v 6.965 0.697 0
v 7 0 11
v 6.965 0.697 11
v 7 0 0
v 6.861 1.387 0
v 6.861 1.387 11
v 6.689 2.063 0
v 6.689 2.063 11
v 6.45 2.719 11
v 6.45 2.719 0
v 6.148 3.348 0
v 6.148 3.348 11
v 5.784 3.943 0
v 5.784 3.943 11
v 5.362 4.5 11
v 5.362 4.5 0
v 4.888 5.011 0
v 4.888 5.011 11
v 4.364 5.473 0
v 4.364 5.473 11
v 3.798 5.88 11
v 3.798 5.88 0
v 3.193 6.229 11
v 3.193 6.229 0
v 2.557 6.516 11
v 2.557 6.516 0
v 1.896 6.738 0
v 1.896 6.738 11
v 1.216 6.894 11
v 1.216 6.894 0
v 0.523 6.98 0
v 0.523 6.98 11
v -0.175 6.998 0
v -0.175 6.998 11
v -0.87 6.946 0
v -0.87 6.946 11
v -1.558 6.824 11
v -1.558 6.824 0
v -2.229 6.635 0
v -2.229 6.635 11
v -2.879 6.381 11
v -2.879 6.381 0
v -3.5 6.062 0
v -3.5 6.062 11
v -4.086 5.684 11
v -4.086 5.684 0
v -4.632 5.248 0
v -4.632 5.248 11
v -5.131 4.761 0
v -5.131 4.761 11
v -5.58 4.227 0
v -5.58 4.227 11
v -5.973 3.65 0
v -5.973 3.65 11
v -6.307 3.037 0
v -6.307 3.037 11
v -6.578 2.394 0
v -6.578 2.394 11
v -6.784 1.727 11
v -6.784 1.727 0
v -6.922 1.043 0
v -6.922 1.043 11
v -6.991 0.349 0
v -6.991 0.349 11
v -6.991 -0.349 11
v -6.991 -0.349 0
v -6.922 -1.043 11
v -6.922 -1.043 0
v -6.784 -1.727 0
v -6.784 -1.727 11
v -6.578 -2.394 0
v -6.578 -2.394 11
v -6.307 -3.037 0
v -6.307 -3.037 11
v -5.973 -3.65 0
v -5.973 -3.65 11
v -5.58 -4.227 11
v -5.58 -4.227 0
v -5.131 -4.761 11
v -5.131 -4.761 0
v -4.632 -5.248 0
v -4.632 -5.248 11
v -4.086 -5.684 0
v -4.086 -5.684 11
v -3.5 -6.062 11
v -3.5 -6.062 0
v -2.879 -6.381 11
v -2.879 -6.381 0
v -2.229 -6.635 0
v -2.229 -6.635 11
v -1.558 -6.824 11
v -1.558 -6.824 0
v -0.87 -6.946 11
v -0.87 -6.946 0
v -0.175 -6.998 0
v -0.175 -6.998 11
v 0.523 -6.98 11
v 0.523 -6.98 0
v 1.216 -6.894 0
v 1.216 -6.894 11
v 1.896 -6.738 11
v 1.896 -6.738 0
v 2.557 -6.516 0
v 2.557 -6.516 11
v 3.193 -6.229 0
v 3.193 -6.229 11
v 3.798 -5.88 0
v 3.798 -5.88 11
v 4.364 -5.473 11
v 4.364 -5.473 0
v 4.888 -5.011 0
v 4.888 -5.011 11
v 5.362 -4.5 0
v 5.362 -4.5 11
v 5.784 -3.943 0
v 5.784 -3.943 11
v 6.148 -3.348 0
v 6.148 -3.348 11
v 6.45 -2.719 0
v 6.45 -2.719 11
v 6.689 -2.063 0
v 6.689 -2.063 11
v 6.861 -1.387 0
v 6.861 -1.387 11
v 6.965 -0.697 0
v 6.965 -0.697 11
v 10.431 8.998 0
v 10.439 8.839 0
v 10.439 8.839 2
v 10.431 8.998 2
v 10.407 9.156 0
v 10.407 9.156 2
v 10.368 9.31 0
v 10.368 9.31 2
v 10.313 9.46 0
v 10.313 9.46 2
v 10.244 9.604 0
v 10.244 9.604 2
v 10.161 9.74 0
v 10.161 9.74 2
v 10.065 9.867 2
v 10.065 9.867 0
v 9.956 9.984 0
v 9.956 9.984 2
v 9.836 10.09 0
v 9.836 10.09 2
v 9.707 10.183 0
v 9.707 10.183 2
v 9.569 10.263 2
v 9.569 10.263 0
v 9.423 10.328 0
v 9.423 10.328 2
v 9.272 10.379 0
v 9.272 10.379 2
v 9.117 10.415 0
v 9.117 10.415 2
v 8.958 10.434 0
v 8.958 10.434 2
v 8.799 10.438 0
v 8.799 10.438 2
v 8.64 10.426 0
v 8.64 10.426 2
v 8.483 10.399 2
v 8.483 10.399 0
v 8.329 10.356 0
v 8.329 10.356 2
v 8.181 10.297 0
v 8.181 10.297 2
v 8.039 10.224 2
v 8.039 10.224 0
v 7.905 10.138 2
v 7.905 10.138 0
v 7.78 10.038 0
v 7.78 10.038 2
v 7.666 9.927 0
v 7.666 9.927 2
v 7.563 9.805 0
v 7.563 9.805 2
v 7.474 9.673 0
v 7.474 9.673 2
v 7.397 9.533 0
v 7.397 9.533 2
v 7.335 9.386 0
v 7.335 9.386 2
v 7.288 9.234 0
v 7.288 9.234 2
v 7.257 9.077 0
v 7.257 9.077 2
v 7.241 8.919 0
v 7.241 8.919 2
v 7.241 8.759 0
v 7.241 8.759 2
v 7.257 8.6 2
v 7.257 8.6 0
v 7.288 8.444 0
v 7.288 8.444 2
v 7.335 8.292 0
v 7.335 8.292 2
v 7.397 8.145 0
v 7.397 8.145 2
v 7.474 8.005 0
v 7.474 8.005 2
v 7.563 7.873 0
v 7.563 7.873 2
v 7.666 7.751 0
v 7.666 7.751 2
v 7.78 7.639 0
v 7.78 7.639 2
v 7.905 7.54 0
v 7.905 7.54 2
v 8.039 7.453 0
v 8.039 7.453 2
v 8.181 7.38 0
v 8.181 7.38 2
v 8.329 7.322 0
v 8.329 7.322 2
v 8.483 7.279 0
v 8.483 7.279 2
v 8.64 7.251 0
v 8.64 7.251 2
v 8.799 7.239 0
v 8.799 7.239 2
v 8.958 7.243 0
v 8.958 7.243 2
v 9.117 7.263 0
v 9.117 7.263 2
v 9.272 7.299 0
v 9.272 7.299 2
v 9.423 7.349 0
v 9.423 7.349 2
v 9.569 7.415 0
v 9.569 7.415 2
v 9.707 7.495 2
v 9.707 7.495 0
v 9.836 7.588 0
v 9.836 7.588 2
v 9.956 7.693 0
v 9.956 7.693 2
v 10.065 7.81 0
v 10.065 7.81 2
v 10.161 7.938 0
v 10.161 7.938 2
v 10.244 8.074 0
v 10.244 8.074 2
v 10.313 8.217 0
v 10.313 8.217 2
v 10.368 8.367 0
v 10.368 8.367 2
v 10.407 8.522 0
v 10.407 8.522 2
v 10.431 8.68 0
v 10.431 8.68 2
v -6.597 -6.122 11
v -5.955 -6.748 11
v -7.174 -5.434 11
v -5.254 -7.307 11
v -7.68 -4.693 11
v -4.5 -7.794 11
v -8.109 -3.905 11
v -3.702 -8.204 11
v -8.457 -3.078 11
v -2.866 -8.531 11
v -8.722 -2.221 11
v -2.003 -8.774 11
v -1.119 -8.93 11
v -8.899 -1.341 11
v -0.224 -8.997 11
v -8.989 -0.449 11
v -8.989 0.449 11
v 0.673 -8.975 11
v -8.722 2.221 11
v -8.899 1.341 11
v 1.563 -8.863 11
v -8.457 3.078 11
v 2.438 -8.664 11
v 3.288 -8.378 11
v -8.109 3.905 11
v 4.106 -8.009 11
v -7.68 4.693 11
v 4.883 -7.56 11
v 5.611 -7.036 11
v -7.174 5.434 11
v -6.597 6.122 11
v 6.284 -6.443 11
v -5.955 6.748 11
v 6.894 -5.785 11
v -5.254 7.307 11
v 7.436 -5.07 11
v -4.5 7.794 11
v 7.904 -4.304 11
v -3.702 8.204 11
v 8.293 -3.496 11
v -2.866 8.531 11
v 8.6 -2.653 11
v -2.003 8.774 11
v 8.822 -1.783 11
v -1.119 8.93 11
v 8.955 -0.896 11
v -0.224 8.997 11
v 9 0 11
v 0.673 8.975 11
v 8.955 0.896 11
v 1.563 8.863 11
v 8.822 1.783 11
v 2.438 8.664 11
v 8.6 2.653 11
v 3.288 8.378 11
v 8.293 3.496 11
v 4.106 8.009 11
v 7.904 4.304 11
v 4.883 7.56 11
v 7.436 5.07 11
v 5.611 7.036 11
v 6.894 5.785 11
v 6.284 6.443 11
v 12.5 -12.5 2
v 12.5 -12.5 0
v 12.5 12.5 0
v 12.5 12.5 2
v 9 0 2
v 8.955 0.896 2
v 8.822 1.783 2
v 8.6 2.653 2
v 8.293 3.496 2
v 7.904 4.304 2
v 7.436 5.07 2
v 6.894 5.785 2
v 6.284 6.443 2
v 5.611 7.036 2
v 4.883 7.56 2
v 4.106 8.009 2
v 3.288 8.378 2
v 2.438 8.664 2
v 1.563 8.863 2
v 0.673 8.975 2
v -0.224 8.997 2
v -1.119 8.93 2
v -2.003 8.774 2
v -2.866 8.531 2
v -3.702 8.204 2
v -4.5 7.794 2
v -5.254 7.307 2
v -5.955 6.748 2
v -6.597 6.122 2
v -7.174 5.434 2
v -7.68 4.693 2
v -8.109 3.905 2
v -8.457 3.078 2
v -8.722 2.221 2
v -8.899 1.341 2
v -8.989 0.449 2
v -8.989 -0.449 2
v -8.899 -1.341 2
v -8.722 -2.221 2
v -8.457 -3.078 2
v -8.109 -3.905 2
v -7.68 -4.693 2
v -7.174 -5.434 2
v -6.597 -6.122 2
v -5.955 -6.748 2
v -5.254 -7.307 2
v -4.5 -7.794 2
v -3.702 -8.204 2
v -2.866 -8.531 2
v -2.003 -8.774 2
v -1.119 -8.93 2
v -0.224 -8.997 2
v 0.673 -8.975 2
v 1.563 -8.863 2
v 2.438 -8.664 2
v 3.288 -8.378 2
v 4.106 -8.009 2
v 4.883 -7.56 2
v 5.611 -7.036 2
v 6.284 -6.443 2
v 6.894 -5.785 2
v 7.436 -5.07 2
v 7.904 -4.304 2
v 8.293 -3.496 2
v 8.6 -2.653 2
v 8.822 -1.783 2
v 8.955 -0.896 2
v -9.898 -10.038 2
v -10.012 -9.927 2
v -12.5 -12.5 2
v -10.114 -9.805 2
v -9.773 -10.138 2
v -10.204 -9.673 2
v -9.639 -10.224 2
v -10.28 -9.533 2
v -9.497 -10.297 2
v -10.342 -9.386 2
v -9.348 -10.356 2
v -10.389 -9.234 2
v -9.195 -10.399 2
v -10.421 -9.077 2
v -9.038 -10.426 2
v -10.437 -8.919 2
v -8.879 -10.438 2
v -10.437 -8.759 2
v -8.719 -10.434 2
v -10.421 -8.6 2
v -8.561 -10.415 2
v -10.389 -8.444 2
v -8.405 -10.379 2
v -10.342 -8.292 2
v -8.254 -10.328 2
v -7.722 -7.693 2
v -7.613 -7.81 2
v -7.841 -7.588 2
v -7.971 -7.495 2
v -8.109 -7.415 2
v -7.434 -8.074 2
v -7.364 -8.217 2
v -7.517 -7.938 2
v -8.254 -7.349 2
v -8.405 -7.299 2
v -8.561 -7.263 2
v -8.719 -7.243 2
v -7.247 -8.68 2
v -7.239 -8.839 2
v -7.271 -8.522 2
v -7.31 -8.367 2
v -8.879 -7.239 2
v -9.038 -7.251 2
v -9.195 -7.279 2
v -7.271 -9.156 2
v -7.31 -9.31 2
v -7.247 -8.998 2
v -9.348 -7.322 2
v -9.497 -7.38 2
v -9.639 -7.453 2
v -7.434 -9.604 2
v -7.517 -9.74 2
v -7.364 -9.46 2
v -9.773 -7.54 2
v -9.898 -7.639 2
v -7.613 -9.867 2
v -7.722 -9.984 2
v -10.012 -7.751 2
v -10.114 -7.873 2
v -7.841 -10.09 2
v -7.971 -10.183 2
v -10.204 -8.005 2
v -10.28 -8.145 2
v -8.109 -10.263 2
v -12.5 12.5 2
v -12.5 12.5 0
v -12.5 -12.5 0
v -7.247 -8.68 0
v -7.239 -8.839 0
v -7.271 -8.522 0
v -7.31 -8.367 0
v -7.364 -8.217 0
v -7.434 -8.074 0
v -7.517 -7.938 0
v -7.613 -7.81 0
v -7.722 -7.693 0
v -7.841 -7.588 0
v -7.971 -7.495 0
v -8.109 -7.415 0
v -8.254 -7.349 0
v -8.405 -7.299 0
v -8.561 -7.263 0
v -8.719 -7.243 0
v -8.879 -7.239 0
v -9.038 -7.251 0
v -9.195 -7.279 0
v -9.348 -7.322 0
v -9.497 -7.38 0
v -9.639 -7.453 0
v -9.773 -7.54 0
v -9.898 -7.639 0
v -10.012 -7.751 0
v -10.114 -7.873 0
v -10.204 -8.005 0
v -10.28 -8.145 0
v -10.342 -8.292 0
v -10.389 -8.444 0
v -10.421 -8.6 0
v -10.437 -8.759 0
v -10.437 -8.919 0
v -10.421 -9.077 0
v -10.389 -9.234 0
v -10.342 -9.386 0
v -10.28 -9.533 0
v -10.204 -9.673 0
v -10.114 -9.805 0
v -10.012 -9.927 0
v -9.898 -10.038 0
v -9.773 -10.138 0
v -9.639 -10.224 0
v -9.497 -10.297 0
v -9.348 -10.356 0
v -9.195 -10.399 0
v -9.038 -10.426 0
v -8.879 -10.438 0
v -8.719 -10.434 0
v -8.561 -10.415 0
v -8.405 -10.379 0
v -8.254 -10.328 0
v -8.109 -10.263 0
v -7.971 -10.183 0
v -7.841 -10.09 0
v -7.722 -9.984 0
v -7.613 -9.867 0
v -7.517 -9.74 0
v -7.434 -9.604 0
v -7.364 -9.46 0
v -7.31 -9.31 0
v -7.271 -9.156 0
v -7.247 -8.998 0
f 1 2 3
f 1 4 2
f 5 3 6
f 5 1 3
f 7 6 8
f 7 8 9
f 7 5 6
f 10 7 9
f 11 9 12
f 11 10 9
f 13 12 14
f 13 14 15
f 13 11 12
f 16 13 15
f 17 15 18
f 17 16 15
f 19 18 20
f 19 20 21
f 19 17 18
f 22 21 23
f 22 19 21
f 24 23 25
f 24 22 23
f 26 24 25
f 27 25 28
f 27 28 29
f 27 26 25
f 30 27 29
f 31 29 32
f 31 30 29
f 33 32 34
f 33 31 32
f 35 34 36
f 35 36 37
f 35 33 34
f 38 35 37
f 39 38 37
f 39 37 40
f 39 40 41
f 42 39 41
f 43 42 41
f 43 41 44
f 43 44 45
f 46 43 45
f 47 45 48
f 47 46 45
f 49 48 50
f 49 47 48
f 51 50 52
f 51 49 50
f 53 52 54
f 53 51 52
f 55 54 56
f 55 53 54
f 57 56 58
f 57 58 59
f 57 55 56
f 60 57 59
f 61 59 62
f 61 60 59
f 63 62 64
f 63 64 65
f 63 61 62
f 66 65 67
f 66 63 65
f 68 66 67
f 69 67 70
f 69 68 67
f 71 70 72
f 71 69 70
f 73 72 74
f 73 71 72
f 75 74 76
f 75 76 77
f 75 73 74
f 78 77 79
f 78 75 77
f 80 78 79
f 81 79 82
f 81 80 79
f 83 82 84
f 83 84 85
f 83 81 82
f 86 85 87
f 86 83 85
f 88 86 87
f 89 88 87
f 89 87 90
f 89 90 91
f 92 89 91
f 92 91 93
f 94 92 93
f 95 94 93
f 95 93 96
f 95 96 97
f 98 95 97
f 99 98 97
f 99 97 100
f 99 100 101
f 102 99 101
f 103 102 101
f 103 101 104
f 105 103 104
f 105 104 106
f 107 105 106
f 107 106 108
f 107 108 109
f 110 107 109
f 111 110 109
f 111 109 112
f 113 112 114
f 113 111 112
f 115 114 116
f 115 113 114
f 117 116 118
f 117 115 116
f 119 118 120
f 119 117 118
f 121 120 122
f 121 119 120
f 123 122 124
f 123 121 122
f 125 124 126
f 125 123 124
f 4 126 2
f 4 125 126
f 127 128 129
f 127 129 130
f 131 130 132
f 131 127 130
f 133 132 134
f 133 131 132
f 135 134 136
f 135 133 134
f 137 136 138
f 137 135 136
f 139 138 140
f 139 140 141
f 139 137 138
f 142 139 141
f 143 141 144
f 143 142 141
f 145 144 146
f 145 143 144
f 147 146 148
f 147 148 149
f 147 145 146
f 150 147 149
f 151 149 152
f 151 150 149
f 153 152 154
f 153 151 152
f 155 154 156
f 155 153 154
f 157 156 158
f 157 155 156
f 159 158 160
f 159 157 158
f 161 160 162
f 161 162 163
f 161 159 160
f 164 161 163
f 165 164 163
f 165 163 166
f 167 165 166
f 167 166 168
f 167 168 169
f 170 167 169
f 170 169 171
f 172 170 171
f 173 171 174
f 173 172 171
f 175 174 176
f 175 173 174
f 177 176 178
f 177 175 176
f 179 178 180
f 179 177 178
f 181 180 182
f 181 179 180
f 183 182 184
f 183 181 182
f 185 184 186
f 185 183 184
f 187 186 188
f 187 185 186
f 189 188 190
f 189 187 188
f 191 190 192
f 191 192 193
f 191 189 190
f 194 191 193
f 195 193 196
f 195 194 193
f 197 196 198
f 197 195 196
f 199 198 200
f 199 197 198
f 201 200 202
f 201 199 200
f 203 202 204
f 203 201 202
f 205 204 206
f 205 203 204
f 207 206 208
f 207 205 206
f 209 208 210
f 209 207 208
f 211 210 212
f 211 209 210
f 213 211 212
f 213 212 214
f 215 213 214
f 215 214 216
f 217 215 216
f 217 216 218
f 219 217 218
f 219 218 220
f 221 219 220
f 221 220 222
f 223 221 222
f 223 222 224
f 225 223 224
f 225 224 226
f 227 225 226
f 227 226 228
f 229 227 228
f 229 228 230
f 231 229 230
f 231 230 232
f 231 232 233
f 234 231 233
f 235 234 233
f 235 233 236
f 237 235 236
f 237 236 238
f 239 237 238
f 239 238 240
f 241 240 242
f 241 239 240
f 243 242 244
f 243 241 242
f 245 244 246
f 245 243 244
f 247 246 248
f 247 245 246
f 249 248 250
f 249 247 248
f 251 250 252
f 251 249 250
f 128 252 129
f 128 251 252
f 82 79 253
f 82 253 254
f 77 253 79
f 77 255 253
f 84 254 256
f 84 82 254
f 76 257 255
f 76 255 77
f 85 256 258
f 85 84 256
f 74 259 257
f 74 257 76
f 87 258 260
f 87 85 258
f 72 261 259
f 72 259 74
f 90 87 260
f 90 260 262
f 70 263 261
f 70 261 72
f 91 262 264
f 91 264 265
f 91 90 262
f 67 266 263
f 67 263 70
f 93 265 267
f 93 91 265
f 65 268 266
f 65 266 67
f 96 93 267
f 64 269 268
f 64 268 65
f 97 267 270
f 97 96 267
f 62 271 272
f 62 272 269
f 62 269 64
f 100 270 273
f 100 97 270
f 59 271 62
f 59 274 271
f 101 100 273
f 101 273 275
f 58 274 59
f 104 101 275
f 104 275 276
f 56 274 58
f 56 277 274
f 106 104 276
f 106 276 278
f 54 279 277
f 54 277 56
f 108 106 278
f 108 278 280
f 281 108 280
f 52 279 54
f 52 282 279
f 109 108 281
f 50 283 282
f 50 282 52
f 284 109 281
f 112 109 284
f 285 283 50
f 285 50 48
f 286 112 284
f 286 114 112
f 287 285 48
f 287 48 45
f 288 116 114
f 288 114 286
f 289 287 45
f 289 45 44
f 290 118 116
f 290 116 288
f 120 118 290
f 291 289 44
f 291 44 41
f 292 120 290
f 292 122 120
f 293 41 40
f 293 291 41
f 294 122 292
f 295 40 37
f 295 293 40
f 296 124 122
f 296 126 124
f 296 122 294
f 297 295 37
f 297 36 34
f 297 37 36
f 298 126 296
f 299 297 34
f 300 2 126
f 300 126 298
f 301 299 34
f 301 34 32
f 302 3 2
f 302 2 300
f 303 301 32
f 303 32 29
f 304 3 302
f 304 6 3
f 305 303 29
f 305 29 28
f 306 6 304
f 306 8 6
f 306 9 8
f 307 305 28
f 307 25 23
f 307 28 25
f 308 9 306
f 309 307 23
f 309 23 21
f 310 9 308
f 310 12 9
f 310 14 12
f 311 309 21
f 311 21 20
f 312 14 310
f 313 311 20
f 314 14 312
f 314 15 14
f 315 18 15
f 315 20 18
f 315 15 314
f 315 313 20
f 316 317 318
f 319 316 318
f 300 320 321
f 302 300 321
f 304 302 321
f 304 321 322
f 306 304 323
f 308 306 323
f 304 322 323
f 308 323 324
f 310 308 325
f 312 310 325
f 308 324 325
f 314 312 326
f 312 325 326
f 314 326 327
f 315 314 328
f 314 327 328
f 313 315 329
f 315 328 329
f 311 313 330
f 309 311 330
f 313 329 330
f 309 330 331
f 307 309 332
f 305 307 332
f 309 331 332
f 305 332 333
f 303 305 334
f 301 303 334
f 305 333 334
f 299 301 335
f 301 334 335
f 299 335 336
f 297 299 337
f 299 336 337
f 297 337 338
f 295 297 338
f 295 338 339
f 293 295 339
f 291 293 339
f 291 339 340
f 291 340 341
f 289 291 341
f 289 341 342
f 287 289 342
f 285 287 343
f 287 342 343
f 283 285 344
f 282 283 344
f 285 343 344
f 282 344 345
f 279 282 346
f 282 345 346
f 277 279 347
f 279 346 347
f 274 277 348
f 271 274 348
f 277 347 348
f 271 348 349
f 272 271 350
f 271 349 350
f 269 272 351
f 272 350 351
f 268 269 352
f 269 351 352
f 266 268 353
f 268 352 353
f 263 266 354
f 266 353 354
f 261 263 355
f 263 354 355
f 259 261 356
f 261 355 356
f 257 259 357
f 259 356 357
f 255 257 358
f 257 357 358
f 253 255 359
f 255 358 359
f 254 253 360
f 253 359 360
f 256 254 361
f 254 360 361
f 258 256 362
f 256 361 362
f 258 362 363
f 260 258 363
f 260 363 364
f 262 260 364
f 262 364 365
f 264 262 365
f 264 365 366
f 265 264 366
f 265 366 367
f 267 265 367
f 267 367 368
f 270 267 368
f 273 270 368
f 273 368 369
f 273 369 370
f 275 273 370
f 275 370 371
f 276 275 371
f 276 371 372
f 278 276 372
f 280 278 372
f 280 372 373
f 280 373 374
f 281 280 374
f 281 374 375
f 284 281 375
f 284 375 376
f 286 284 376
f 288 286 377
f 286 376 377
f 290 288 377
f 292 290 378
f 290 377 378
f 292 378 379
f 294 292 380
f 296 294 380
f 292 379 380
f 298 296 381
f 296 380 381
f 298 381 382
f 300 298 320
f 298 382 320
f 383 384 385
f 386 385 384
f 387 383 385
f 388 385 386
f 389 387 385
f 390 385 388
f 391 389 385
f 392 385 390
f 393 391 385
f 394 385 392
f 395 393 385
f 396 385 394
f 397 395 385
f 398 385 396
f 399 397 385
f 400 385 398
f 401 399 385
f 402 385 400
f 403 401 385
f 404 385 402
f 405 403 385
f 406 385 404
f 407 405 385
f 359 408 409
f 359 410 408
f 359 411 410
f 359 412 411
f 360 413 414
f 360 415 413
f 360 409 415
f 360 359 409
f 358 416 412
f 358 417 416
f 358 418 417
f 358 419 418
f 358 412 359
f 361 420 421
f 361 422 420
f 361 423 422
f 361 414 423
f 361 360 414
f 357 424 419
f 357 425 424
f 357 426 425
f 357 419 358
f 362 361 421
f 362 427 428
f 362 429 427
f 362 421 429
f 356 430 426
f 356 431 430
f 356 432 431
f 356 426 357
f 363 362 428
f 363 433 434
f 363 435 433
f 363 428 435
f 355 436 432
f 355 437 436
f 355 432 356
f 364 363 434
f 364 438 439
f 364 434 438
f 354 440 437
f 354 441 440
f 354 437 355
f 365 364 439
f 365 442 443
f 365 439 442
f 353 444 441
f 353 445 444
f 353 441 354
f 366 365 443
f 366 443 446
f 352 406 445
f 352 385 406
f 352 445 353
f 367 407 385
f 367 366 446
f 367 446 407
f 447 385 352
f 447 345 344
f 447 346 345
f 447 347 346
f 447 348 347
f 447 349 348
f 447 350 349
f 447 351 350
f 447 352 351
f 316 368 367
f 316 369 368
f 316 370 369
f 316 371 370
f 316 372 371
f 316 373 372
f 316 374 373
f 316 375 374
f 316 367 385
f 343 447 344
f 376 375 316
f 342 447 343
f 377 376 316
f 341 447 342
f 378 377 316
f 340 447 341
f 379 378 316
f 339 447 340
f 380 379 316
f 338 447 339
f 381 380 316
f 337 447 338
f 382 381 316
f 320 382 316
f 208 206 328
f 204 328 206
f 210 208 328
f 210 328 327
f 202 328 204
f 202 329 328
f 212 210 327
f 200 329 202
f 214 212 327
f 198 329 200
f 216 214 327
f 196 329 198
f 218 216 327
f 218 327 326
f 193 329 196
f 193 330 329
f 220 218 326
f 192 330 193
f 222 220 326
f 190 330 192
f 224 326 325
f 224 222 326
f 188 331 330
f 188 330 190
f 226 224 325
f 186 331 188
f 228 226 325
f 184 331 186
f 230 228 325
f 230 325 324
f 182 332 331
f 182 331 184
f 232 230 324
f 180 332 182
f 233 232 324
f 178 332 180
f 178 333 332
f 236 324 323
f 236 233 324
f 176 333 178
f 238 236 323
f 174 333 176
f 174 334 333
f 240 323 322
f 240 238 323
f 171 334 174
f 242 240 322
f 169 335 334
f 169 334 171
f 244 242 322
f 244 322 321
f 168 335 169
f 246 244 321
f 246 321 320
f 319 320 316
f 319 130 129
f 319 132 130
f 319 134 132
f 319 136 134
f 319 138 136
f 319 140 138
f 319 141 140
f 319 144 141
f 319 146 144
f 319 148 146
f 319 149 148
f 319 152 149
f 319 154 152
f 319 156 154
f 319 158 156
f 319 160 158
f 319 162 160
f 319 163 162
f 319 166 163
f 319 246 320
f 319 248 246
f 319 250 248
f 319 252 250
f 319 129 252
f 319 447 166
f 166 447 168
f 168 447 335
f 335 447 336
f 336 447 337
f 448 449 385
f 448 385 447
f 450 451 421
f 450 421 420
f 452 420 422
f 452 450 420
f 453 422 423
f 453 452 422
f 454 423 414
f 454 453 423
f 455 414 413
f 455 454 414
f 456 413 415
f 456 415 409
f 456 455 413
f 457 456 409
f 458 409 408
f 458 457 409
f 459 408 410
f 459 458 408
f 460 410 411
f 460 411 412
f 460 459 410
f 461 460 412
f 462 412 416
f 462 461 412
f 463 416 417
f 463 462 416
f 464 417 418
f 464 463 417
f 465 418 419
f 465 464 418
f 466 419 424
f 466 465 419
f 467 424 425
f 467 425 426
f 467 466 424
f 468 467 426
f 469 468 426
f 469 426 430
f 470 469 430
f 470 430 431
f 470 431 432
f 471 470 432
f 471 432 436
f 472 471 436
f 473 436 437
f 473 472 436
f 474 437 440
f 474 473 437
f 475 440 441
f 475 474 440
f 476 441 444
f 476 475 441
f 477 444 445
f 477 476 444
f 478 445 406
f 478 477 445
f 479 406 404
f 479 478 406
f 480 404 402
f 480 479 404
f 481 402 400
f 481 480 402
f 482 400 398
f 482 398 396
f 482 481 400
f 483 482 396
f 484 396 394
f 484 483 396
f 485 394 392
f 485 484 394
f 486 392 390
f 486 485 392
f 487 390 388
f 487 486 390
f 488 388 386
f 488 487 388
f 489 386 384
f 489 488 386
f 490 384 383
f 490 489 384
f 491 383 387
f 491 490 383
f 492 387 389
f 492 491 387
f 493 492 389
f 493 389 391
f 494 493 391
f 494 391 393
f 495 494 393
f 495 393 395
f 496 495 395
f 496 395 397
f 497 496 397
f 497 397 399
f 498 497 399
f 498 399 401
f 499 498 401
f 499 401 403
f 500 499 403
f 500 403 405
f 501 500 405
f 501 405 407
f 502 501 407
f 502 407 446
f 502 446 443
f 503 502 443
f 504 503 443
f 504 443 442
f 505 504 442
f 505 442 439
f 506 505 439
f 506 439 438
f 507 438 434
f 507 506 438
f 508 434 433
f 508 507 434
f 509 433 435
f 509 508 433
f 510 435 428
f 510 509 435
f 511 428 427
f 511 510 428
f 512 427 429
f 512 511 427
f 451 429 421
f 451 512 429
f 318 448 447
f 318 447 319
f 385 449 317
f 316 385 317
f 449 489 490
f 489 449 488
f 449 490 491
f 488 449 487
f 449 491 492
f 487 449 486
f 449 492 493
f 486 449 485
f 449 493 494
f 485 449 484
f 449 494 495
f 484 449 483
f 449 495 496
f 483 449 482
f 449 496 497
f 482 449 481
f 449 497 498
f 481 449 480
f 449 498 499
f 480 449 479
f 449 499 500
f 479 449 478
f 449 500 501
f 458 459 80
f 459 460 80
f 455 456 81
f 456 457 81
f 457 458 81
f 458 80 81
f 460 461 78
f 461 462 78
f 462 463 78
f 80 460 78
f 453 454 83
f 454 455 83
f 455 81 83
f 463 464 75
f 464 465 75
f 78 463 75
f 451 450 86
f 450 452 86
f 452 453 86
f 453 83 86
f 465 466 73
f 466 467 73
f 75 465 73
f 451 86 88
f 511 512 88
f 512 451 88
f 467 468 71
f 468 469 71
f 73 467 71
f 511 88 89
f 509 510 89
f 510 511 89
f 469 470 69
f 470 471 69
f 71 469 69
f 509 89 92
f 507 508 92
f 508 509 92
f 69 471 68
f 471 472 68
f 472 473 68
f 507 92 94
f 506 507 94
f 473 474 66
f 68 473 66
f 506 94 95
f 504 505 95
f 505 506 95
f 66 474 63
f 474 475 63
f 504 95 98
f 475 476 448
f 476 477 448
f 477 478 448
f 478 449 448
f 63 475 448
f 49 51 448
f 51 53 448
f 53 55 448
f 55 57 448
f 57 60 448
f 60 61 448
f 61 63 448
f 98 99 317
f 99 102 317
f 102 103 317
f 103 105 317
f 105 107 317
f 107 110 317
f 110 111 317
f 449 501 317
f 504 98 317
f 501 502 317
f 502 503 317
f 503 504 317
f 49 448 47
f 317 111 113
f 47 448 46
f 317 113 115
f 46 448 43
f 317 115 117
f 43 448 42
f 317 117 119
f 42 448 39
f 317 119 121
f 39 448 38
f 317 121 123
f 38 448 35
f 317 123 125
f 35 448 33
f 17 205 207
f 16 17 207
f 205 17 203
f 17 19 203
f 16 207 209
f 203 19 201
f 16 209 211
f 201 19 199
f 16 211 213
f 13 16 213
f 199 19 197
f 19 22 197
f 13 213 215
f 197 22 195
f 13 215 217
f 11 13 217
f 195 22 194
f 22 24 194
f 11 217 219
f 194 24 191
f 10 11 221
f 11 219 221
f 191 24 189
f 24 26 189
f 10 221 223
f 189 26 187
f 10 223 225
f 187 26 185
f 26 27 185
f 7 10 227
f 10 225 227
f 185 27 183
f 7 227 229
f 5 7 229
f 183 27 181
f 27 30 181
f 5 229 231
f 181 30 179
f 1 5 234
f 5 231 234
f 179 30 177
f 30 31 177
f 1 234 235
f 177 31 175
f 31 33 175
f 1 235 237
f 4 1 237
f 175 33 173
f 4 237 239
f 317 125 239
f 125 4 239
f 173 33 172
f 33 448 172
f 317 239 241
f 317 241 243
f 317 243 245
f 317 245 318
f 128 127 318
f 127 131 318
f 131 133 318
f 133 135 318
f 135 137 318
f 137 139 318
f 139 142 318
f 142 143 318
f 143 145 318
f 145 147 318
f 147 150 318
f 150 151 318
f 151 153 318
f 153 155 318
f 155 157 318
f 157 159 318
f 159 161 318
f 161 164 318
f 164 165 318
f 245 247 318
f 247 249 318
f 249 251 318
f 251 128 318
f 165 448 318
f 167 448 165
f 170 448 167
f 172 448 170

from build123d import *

# Parameters (mm, degrees)
F0_W     = 25
F0_H     = 25
F0_R     = 1.6
F0_R_2   = 7
F1_DEPTH = 2
F2_R     = 9
F2_R_2   = 7
F3_DEPTH = 9


with BuildPart() as f1:
    # F0 (on Top) → F1 (new body)
    with BuildSketch(Plane.XY):
        Rectangle(F0_W, F0_H)
        with Locations((-8.838835, -8.838835)):
            Circle(F0_R, mode=Mode.SUBTRACT)
        Circle(F0_R_2, mode=Mode.SUBTRACT)
        with Locations((8.838835, 8.838835)):
            Circle(F0_R, mode=Mode.SUBTRACT)
    extrude(amount=F1_DEPTH)

    # F2 (on face) → F3 (join)
    with BuildSketch(Plane.XY.offset(2)):
        Circle(F2_R)
        Circle(F2_R_2, mode=Mode.SUBTRACT)
    extrude(amount=F3_DEPTH)


solid = f1.part
